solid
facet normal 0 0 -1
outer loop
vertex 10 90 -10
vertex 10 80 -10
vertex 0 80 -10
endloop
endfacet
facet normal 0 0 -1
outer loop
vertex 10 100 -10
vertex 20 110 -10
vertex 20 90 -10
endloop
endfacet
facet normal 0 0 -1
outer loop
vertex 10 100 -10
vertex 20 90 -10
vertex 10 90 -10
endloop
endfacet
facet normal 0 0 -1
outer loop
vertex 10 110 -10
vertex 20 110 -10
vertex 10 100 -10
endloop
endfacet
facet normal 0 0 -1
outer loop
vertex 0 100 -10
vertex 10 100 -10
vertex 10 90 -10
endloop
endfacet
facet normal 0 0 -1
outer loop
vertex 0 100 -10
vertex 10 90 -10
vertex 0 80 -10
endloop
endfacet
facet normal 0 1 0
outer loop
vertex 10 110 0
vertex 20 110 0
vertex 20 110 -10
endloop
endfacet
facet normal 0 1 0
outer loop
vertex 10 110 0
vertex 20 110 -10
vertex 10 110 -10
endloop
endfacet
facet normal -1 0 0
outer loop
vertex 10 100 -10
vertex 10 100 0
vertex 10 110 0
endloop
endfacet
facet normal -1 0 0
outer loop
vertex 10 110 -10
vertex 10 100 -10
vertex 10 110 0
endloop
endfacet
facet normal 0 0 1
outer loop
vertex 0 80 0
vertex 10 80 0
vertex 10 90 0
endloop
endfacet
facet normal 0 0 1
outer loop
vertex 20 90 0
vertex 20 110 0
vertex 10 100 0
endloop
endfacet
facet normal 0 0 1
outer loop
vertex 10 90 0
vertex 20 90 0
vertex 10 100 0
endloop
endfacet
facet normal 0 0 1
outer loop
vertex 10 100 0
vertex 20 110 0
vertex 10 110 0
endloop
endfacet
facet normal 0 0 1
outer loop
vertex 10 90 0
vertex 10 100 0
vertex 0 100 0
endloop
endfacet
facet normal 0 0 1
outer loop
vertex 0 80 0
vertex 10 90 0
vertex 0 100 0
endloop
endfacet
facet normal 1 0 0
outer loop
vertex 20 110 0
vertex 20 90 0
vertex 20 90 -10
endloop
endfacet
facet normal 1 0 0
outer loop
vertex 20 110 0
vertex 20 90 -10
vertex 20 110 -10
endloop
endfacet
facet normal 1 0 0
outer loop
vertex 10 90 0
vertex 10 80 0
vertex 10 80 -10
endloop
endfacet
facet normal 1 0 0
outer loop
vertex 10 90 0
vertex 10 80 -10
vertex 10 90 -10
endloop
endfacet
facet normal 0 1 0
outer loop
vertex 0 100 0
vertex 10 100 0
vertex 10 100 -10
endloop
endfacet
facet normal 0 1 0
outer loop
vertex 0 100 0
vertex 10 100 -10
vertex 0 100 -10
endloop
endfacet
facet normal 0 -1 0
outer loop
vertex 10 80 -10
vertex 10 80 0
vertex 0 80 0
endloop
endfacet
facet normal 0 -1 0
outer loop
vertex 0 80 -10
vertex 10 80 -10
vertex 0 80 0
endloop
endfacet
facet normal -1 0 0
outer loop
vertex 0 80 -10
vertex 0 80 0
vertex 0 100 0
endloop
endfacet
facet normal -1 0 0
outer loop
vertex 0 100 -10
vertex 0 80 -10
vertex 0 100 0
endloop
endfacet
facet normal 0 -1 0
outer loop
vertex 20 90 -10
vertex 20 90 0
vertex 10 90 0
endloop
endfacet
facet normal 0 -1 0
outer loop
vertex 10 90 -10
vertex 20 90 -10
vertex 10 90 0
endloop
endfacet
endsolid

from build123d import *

# Parameters (mm, degrees)
BOX026_W                     = 10
BOX026_H                     = 10
BOX026_DEPTH                 = 10
BOX027_W                     = 10
BOX027_H                     = 10
BOX027_DEPTH                 = 10
BOX028_W                     = 10
BOX028_H                     = 10
BOX028_DEPTH                 = 10
BOX029_W                     = 10
BOX029_H                     = 10
BOX029_DEPTH                 = 10
FUSION002006_PLACEMENT_ANGLE = 180


with BuildPart() as cubo026:
    # Box026 → Box026 (new body)
    with BuildSketch(Plane(origin=(0, 10, 0), x_dir=(1, 0, 0), z_dir=(0, 0, 1))):
        with Locations((5, 5)):
            Rectangle(BOX026_W, BOX026_H)
    extrude(amount=BOX026_DEPTH)


with BuildPart() as cubo027:
    # Box027 → Box027 (new body)
    with BuildSketch(Plane(origin=(10, 10, 0), x_dir=(1, 0, 0), z_dir=(0, 0, 1))):
        with Locations((5, 5)):
            Rectangle(BOX027_W, BOX027_H)
    extrude(amount=BOX027_DEPTH)


with BuildPart() as cubo028:
    # Box028 → Box028 (new body)
    with BuildSketch(Plane(origin=(0, 20, 0), x_dir=(1, 0, 0), z_dir=(0, 0, 1))):
        with Locations((5, 5)):
            Rectangle(BOX028_W, BOX028_H)
    extrude(amount=BOX028_DEPTH)


with BuildPart() as fusion002006:
    # Box029 → Box029 (new body)
    with BuildSketch(Plane(origin=(10, 0, 0), x_dir=(1, 0, 0), z_dir=(0, 0, 1))):
        with Locations((5, 5)):
            Rectangle(BOX029_W, BOX029_H)
    extrude(amount=BOX029_DEPTH)

    # Fusion002006: union Cubo026, Cubo027, Cubo028
    add(cubo026.part)
    add(cubo027.part)
    add(cubo028.part)


with BuildPart() as fusion002006_1:
    # Fusion002006 placement: moved
    add(fusion002006.part.moved(Location((20, 80, 0))).rotate(Axis((20, 80, 0), (0, 1, 0)), FUSION002006_PLACEMENT_ANGLE))


solid = fusion002006_1.part
